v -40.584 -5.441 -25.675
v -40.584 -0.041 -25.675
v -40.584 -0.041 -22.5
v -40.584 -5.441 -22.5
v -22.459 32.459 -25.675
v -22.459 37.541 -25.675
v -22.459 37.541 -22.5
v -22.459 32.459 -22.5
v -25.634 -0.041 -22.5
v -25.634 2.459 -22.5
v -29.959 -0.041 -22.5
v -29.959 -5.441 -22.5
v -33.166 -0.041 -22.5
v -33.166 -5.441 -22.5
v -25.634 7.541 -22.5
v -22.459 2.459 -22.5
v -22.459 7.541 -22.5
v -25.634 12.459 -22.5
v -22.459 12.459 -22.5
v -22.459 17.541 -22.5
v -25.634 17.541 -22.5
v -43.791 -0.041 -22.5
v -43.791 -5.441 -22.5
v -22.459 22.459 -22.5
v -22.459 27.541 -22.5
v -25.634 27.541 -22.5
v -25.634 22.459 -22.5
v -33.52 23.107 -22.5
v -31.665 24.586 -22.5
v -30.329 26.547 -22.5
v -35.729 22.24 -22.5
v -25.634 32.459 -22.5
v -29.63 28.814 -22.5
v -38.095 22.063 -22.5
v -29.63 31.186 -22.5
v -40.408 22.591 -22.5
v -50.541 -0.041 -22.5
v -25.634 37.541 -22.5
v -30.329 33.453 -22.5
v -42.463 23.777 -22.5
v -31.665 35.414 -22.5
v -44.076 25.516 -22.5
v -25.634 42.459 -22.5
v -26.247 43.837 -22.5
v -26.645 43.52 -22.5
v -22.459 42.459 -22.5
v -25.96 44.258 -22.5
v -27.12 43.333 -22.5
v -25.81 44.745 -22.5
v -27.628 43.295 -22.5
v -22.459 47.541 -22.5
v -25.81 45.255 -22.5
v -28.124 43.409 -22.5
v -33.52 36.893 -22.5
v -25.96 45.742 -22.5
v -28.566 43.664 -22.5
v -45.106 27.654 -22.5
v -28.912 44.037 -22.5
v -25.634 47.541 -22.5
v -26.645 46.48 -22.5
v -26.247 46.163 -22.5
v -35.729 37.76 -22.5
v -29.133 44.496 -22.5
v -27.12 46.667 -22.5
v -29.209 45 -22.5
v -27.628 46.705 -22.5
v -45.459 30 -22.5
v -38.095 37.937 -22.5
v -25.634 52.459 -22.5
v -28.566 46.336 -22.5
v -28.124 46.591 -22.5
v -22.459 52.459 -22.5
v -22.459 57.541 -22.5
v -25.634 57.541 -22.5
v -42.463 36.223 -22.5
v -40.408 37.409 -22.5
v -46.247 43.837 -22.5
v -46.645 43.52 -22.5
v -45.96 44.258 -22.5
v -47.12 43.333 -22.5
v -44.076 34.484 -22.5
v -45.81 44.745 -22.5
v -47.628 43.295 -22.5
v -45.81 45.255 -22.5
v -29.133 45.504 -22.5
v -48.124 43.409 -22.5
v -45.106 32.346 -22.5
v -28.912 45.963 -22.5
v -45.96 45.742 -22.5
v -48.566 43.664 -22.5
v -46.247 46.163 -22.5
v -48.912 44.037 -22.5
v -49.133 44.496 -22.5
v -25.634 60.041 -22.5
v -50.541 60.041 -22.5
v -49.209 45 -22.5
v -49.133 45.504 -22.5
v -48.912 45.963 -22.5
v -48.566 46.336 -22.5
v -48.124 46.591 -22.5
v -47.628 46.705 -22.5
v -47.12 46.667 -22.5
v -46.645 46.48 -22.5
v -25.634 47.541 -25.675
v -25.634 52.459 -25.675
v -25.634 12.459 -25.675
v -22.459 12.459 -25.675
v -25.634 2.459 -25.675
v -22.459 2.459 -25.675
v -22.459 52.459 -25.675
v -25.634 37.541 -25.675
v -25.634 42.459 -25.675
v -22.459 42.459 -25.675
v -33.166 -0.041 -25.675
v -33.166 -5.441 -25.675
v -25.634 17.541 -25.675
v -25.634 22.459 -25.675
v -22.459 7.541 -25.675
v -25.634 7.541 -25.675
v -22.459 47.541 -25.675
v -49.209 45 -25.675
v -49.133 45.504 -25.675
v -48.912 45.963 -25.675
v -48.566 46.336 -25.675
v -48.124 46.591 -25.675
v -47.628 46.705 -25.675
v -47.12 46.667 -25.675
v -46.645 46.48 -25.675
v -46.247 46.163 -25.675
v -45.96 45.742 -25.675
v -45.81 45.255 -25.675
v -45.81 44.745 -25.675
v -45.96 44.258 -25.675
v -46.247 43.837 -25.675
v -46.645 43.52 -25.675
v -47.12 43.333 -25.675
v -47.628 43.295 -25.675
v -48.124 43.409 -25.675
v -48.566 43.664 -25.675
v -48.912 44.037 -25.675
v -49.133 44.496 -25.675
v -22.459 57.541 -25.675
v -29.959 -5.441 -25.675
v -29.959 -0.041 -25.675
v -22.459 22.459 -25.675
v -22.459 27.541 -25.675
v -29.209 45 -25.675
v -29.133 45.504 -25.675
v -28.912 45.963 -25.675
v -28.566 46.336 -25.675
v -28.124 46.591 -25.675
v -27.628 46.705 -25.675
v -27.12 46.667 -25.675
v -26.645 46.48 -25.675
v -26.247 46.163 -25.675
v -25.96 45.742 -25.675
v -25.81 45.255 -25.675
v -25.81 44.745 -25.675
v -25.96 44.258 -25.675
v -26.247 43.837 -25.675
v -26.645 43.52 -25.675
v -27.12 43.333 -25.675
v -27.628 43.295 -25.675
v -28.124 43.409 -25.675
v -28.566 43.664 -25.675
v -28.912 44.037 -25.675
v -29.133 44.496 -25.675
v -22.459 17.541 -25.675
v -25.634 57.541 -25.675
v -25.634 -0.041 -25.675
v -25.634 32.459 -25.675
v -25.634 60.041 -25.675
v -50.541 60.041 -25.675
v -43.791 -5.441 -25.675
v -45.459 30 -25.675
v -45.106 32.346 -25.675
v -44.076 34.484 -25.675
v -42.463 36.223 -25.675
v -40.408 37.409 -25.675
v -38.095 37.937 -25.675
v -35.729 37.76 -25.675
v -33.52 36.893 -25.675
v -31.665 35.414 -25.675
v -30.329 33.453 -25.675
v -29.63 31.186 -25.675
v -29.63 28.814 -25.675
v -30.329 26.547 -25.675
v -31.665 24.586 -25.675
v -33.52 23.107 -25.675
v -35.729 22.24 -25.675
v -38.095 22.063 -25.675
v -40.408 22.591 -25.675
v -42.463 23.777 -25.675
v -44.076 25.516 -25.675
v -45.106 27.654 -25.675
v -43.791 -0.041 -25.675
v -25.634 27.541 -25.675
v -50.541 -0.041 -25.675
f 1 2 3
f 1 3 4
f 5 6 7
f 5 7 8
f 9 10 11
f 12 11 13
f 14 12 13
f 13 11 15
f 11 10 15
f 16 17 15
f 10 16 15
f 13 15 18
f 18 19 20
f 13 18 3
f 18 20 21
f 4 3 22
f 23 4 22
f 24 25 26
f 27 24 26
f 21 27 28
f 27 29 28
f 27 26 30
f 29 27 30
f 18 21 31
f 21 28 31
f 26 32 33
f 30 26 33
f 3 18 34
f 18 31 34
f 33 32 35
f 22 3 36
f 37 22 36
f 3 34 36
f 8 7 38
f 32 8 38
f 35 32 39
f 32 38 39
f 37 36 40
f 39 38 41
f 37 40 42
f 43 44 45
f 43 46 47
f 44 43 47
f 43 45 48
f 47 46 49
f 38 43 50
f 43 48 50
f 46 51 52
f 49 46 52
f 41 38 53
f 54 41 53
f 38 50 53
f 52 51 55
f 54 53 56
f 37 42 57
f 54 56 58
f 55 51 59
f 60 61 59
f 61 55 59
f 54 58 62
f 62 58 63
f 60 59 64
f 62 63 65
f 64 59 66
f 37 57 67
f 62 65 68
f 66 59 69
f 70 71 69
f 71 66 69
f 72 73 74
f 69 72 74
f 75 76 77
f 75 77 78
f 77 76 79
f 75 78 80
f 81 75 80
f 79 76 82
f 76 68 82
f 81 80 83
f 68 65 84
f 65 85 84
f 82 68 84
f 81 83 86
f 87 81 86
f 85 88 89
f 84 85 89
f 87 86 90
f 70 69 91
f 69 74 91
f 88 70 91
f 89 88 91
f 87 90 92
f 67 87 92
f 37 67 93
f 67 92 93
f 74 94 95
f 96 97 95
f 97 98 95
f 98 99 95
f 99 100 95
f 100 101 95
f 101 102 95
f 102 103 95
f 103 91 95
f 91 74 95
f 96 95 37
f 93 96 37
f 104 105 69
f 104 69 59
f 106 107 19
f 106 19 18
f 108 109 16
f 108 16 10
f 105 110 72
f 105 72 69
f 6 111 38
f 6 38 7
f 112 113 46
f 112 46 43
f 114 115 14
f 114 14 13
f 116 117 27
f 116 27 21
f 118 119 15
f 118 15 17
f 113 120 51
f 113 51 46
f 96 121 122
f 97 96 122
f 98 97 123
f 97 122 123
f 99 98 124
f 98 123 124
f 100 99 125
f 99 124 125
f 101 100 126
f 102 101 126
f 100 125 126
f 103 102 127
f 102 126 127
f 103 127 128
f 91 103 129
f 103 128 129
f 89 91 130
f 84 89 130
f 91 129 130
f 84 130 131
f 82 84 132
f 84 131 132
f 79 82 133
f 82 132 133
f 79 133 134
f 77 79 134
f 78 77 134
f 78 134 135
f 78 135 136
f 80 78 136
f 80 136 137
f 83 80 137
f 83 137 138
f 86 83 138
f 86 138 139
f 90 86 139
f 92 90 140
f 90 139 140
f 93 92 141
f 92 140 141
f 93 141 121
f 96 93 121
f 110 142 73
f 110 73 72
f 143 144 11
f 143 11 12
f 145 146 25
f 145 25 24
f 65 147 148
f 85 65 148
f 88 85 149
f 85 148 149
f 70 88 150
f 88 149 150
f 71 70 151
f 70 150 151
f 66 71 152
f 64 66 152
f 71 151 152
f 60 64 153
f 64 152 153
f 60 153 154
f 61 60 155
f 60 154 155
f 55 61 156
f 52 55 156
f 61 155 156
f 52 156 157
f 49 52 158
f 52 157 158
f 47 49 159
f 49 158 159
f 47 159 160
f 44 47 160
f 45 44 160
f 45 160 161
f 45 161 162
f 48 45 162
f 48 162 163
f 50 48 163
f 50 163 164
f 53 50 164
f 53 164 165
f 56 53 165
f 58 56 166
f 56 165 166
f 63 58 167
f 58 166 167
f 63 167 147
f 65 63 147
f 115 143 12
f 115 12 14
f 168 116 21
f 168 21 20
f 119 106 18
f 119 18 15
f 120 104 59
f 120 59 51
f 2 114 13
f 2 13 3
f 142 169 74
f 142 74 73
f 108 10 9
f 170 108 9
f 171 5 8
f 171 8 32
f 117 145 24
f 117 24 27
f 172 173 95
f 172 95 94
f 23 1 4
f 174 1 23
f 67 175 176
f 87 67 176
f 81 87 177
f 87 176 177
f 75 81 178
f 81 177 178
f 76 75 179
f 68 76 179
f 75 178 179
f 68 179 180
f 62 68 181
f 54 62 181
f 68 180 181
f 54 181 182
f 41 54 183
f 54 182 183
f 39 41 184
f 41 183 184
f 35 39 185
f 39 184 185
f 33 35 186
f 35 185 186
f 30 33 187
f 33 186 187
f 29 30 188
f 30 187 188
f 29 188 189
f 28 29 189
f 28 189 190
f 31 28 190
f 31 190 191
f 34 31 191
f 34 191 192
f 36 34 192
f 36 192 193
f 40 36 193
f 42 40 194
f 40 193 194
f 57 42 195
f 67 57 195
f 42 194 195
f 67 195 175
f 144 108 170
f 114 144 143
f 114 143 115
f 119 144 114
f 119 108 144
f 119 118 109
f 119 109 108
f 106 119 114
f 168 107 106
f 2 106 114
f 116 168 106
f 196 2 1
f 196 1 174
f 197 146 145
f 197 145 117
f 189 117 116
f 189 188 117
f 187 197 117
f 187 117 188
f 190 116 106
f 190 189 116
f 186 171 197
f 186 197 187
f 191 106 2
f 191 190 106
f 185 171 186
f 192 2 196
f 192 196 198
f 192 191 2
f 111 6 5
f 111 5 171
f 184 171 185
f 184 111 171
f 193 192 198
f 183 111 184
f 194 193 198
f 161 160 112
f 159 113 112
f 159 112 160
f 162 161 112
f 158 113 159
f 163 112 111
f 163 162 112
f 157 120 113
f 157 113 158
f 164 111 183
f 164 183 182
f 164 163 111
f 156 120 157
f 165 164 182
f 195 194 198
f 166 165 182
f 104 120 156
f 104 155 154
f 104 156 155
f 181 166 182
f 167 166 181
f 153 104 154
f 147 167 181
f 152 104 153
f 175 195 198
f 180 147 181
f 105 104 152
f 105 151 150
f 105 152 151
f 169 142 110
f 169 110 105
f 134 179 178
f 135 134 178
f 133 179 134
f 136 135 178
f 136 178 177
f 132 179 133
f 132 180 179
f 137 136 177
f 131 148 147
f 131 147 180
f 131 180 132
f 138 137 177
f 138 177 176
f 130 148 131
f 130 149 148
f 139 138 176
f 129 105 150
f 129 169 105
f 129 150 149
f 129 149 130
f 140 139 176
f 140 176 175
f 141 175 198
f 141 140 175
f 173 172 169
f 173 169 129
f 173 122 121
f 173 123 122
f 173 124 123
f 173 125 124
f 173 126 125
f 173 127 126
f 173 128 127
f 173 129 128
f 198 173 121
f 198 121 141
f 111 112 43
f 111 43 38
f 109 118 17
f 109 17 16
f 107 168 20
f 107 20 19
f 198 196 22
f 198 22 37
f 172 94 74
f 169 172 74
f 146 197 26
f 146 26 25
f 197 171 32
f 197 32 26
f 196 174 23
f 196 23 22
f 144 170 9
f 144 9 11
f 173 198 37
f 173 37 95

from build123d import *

# Parameters (mm, degrees)
SKETCH1_W           = 24.825
SKETCH1_H           = 3.175
SKETCH1_W_2         = 3.175
SKETCH1_H_2         = 24.825
BOSS_EXTRUDE1_DEPTH = 60
SKETCH2_W           = 3.125
SKETCH2_H           = 5.4
BOSS_EXTRUDE4_DEPTH = 3.175
SKETCH4_R           = 8
CUT_EXTRUDE1_DEPTH  = 3.175
SKETCH3_R           = 8
CUT_EXTRUDE2_DEPTH  = 3.175
SKETCH5_W           = 3.175
SKETCH5_H           = 5.4
BOSS_EXTRUDE5_DEPTH = 3.175
SKETCH6_R           = 1.75
CUT_EXTRUDE3_DEPTH  = 10
SKETCH7_R           = 1.75
CUT_EXTRUDE4_DEPTH  = 10
SKETCH8_W           = 3.175
SKETCH8_H           = 65.4
CUT_EXTRUDE6_DEPTH  = 24.825
SKETCH9_W           = 3.175
SKETCH9_H           = 2.5
SKETCH9_H_2         = 5
CUT_EXTRUDE8_DEPTH  = 10
SKETCH10_R          = 1.70936
SKETCH10_R_2        = 7.95936
BOSS_EXTRUDE6_DEPTH = 3.175


with BuildPart() as part:
    # Sketch1 → Boss-Extrude1 (new body)
    with BuildSketch(Plane(origin=(0, 0, 0), x_dir=(1, 0, 0), z_dir=(0, 1, 0))):
        with Locations((-38.0875, 24.0875)):
            Rectangle(SKETCH1_W, SKETCH1_H)
        with Locations((-24.0875, 24.0875)):
            Rectangle(SKETCH1_W_2, SKETCH1_H)
        with Locations((-24.0875, 38.0875)):
            Rectangle(SKETCH1_W_2, SKETCH1_H_2)
    extrude(amount=BOSS_EXTRUDE1_DEPTH)

    # Sketch2 → Boss-Extrude4 (add)
    with BuildSketch(Plane.XY.offset(-22.5)):
        with Locations((-42.1875, -2.7)):
            Rectangle(SKETCH2_W, SKETCH2_H)
        with Locations((-31.5625, -2.7)):
            Rectangle(SKETCH2_W, SKETCH2_H)
    extrude(amount=-BOSS_EXTRUDE4_DEPTH)

    # Sketch4 → Cut-Extrude1 (cut)
    with BuildSketch(Plane.XY.offset(-22.5)):
        with Locations((-37.5, 30)):
            Circle(SKETCH4_R)
    extrude(amount=-CUT_EXTRUDE1_DEPTH, mode=Mode.SUBTRACT)

    # Sketch3 → Cut-Extrude2 (cut)
    with BuildSketch(Plane(origin=(-22.5, 0, 0), x_dir=(0, 0, -1), z_dir=(1, 0, 0))):
        with Locations((37.5, 30)):
            Circle(SKETCH3_R)
    extrude(amount=-CUT_EXTRUDE2_DEPTH, mode=Mode.SUBTRACT)

    # Sketch5 → Boss-Extrude5 (add)
    with BuildSketch(Plane(origin=(-22.5, 0, 0), x_dir=(0, 0, -1), z_dir=(1, 0, 0))):
        with Locations((42.2625, -2.7)):
            Rectangle(SKETCH5_W, SKETCH5_H)
        with Locations((31.5875, -2.7)):
            Rectangle(SKETCH5_W, SKETCH5_H)
    extrude(amount=-BOSS_EXTRUDE5_DEPTH)

    # Sketch6 → Cut-Extrude3 (cut)
    with BuildSketch(Plane.XY.offset(-22.5)):
        with Locations((-47.5, 45)):
            Circle(SKETCH6_R)
        with Locations((-27.5, 45)):
            Circle(SKETCH6_R)
    extrude(amount=-CUT_EXTRUDE3_DEPTH, mode=Mode.SUBTRACT)

    # Sketch7 → Cut-Extrude4 (cut)
    with BuildSketch(Plane(origin=(-22.5, 0, 0), x_dir=(0, 0, -1), z_dir=(1, 0, 0))):
        with Locations((47.5, 45)):
            Circle(SKETCH7_R)
        with Locations((27.5, 45)):
            Circle(SKETCH7_R)
    extrude(amount=-CUT_EXTRUDE4_DEPTH, mode=Mode.SUBTRACT)

    # Sketch8 → Cut-Extrude6 (cut)
    with BuildSketch(Plane(origin=(0, 0, -50.5), x_dir=(-1, 0, 0), z_dir=(0, 0, -1))):
        with Locations((24.0875, 27.3)):
            Rectangle(SKETCH8_W, SKETCH8_H)
    extrude(amount=-CUT_EXTRUDE6_DEPTH, mode=Mode.SUBTRACT)

    # Sketch9 → Cut-Extrude8 (cut)
    with BuildSketch(Plane(origin=(0, 0, -25.675), x_dir=(-1, 0, 0), z_dir=(0, 0, -1))):
        with Locations((24.0875, 58.75)):
            Rectangle(SKETCH9_W, SKETCH9_H)
        with Locations((24.0875, 50)):
            Rectangle(SKETCH9_W, SKETCH9_H_2)
        with Locations((24.0875, 40)):
            Rectangle(SKETCH9_W, SKETCH9_H_2)
        with Locations((24.0875, 30)):
            Rectangle(SKETCH9_W, SKETCH9_H_2)
        with Locations((24.0875, 20)):
            Rectangle(SKETCH9_W, SKETCH9_H_2)
        with Locations((24.0875, 10)):
            Rectangle(SKETCH9_W, SKETCH9_H_2)
        with Locations((24.0875, 1.25)):
            Rectangle(SKETCH9_W, SKETCH9_H)
    extrude(amount=-CUT_EXTRUDE8_DEPTH, mode=Mode.SUBTRACT)

    # Sketch10 → Boss-Extrude6 (add)
    with BuildSketch(Plane(origin=(0, 0, -25.675), x_dir=(-1, 0, 0), z_dir=(0, 0, -1))):
        Polygon((25.63436, 60.04064), (25.63436, 57.54064), (22.45936, 57.54064), (22.45936, 52.45936), (25.63436, 52.45936), (25.63436, 47.54064), (22.45936, 47.54064), (22.45936, 42.45936), (25.63436, 42.45936), (25.63436, 37.54064), (22.45936, 37.54064), (22.45936, 32.45936), (25.63436, 32.45936), (25.63436, 27.54064), (22.45936, 27.54064), (22.45936, 22.45936), (25.63436, 22.45936), (25.63436, 17.54064), (22.45936, 17.54064), (22.45936, 12.45936), (25.63436, 12.45936), (25.63436, 7.54064), (22.45936, 7.54064), (22.45936, 2.45936), (25.63436, 2.45936), (25.63436, -0.04064), (29.95936, -0.04064), (29.95936, -5.44064), (33.16564, -5.44064), (33.16564, -0.04064), (40.58436, -0.04064), (40.58436, -5.44064), (43.79064, -5.44064), (43.79064, -0.04064), (50.54064, -0.04064), (50.54064, 60.04064), align=None)
        with Locations((27.5, 45)):
            Circle(SKETCH10_R, mode=Mode.SUBTRACT)
        with Locations((47.5, 45)):
            Circle(SKETCH10_R, mode=Mode.SUBTRACT)
        with Locations((37.5, 30)):
            Circle(SKETCH10_R_2, mode=Mode.SUBTRACT)
    extrude(amount=-BOSS_EXTRUDE6_DEPTH)


solid = part.part
